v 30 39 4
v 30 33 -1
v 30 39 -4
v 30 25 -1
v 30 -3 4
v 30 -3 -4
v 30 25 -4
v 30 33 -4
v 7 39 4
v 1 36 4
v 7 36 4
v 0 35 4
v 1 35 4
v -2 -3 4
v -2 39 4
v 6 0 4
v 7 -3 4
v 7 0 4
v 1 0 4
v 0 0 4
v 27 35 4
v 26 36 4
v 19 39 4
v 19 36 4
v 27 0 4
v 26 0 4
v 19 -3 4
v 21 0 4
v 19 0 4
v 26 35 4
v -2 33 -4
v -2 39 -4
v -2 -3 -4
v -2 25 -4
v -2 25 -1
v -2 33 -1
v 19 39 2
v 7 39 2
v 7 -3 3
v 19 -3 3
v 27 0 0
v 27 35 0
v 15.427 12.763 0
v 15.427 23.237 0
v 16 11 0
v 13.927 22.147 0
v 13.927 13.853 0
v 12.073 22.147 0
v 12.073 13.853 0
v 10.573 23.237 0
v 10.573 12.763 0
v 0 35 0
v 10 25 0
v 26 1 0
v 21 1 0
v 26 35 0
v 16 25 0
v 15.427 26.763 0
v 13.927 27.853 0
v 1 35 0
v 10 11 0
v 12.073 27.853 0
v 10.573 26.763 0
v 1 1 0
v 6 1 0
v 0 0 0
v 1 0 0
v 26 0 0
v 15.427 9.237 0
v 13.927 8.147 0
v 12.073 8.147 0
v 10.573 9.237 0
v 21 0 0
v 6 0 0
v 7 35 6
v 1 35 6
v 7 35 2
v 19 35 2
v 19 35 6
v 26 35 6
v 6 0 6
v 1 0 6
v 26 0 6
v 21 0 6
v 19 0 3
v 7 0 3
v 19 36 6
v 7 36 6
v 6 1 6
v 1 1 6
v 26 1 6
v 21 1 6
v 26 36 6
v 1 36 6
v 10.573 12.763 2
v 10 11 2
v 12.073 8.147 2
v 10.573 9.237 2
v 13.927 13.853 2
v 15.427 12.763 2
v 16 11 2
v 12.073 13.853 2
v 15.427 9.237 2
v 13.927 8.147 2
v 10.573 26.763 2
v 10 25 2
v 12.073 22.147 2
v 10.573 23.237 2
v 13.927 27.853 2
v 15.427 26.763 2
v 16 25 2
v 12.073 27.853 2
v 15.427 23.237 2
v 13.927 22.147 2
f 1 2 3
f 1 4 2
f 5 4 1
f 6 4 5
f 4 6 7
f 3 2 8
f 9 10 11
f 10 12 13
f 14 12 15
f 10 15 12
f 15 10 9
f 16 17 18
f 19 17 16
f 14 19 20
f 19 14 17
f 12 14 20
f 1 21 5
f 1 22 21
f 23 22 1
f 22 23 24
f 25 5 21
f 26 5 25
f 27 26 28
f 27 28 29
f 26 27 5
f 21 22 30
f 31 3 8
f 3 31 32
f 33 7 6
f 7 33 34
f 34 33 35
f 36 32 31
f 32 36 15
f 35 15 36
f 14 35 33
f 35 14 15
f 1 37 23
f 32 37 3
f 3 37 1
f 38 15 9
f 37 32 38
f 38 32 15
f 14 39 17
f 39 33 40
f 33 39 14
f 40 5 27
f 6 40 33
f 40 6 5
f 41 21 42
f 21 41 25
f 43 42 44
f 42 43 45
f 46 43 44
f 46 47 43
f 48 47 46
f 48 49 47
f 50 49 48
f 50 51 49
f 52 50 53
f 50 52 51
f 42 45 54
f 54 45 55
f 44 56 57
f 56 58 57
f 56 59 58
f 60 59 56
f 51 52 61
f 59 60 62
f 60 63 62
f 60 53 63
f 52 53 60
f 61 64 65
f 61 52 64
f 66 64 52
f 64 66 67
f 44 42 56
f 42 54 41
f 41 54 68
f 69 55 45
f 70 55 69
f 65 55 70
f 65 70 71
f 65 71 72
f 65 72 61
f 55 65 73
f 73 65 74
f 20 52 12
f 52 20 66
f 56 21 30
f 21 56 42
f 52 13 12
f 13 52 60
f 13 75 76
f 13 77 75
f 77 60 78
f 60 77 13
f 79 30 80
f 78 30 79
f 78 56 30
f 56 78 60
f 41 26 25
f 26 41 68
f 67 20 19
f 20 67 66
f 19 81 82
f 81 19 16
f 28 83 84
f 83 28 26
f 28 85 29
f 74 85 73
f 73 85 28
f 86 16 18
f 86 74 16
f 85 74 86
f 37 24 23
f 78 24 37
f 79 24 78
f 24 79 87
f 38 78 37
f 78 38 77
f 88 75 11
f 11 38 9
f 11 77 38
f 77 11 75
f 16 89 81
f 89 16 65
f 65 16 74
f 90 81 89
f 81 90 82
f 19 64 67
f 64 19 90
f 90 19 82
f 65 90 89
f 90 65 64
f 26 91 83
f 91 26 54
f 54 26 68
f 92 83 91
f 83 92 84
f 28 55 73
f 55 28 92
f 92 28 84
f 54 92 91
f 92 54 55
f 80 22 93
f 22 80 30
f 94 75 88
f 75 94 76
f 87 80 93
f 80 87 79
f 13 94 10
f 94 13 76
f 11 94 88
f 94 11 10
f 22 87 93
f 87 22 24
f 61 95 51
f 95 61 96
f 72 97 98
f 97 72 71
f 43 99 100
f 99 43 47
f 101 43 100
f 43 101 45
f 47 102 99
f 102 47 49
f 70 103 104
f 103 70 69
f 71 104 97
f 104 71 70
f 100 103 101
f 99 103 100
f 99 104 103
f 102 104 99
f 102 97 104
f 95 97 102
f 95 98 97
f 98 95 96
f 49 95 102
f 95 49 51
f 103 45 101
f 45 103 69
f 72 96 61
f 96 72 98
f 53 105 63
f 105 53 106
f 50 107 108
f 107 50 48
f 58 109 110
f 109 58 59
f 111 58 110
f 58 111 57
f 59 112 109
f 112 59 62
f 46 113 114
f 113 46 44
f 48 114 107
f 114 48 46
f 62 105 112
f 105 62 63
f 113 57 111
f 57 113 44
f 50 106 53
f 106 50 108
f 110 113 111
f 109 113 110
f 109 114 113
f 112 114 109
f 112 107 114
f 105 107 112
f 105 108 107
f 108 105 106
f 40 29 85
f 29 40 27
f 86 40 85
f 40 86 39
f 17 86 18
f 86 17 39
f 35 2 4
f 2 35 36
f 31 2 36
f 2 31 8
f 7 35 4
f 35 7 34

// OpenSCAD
// Shell!
outerX = 42;
outerY = 32;
outerZ = 28;

// BUTTON!
buttonRadius = 7;
buttonOffsetX = 16;

// Wall!
wallSize = 2;

// Ziptie
zipTieSize = 8;
zipTieOffset = 13;

// parts
drawHead = false;
drawTinyHead = false;
drawFoot = true;

if (drawHead) {
  
  translate([30, -3, 10])
    rotate([0, 0, 90])  
  union() {
    difference(){
      cube([outerX, outerY, outerZ]);
      
      // Hollow out
      union() {
        translate([0,0,-7]);
        innerCube(outerX, outerY, outerZ, wallSize);
      }
      
      // USB hole!
      for (i=[3:9]){
        translate([-1, 11-i/2, 9-i])    
          cube([5, 10+i, 1]);
      }
      
      // Button!
      translate([buttonOffsetX + buttonRadius/2, outerY / 2, outerZ - (wallSize * 3)])
        cylinder(r1=buttonRadius+1, r2=buttonRadius-1, h=wallSize * 4);
      
      // Ziptie!
      translate([outerX - zipTieOffset, -1, outerZ - wallSize])
        cube([zipTieSize, outerY + 2, wallSize * 2]);
    }


    // keep pins
    translate([outerX - 9, outerY / 2 - 6, 8]) 
      cube([5, 12, outerZ - 11]);
    translate([1, outerY / 2 - 6, 15]) 
      cube([5, 12, outerZ - 16]);
  }
}

if (drawTinyHead) {
  
  translate([30, -3, 10])
    rotate([0, 0, 90])  
  union() {
    difference(){
      cube([outerX, outerY, outerZ -17]);
      
      // Hollow out
      union() {
        translate([0,0,-7]);
        innerCube(outerX, outerY, outerZ - 17, wallSize);
      }
      
      // USB hole!
      for (i=[3:9]){
        translate([-1, 11-i/2, 9-i])    
          cube([5, 10+i, 1]);
      }
      
      // Ziptie!
      translate([outerX - zipTieOffset, -1, outerZ - wallSize - 17])
        cube([zipTieSize, outerY + 2, wallSize * 2]);
    }
  }
}

// NOTE: places cube 1 unit lower about Z for clean differences.
module innerCube(x, y, z, wallSize) {  
  translate([wallSize, wallSize, -1])
    cube([x - (wallSize * 2), y - (wallSize * 2), z - (wallSize * 2) + 1]);
}

if (drawFoot){
  difference(){
    union(){ 
      difference() {
        union() {
          translate([-2, -3, -4])
            cube([32, 42, 8]);         
        }
        cube([27, 35, 16]);
          
        // Cord slot
        translate([7, 20, 2])
            cube([12, 50, 6]);    
      }
      difference() {
        union(){
          // flaps
          union(){ 
          translate([1, 0, -4])
              cube([5, 1, 10]);
          translate([21, 0, -4])
              cube([5, 1, 10]);
          }
          translate([1, 35, -4])
              cube([25, 1, 10]);
        }
        // Cord slot
        translate([7, 20, 2])
            cube([12, 50, 6]);   
        
 
      }

      //
      translate([13, 11, -1])
            cylinder(d1=6, d2=6, h=3);
      
      translate([13, 25, -1])
            cylinder(d1=6, d2=6, h=3);
    }
    
    // USB slot
    translate([7, -20, 3])
        cube([12, 21, 6]);  
    
    // Ziptie!
    translate([-2, 38 - zipTieOffset, -2 - wallSize*2])
      cube([outerX + 3, zipTieSize, 1+ (wallSize * 2)]);
  }
}
